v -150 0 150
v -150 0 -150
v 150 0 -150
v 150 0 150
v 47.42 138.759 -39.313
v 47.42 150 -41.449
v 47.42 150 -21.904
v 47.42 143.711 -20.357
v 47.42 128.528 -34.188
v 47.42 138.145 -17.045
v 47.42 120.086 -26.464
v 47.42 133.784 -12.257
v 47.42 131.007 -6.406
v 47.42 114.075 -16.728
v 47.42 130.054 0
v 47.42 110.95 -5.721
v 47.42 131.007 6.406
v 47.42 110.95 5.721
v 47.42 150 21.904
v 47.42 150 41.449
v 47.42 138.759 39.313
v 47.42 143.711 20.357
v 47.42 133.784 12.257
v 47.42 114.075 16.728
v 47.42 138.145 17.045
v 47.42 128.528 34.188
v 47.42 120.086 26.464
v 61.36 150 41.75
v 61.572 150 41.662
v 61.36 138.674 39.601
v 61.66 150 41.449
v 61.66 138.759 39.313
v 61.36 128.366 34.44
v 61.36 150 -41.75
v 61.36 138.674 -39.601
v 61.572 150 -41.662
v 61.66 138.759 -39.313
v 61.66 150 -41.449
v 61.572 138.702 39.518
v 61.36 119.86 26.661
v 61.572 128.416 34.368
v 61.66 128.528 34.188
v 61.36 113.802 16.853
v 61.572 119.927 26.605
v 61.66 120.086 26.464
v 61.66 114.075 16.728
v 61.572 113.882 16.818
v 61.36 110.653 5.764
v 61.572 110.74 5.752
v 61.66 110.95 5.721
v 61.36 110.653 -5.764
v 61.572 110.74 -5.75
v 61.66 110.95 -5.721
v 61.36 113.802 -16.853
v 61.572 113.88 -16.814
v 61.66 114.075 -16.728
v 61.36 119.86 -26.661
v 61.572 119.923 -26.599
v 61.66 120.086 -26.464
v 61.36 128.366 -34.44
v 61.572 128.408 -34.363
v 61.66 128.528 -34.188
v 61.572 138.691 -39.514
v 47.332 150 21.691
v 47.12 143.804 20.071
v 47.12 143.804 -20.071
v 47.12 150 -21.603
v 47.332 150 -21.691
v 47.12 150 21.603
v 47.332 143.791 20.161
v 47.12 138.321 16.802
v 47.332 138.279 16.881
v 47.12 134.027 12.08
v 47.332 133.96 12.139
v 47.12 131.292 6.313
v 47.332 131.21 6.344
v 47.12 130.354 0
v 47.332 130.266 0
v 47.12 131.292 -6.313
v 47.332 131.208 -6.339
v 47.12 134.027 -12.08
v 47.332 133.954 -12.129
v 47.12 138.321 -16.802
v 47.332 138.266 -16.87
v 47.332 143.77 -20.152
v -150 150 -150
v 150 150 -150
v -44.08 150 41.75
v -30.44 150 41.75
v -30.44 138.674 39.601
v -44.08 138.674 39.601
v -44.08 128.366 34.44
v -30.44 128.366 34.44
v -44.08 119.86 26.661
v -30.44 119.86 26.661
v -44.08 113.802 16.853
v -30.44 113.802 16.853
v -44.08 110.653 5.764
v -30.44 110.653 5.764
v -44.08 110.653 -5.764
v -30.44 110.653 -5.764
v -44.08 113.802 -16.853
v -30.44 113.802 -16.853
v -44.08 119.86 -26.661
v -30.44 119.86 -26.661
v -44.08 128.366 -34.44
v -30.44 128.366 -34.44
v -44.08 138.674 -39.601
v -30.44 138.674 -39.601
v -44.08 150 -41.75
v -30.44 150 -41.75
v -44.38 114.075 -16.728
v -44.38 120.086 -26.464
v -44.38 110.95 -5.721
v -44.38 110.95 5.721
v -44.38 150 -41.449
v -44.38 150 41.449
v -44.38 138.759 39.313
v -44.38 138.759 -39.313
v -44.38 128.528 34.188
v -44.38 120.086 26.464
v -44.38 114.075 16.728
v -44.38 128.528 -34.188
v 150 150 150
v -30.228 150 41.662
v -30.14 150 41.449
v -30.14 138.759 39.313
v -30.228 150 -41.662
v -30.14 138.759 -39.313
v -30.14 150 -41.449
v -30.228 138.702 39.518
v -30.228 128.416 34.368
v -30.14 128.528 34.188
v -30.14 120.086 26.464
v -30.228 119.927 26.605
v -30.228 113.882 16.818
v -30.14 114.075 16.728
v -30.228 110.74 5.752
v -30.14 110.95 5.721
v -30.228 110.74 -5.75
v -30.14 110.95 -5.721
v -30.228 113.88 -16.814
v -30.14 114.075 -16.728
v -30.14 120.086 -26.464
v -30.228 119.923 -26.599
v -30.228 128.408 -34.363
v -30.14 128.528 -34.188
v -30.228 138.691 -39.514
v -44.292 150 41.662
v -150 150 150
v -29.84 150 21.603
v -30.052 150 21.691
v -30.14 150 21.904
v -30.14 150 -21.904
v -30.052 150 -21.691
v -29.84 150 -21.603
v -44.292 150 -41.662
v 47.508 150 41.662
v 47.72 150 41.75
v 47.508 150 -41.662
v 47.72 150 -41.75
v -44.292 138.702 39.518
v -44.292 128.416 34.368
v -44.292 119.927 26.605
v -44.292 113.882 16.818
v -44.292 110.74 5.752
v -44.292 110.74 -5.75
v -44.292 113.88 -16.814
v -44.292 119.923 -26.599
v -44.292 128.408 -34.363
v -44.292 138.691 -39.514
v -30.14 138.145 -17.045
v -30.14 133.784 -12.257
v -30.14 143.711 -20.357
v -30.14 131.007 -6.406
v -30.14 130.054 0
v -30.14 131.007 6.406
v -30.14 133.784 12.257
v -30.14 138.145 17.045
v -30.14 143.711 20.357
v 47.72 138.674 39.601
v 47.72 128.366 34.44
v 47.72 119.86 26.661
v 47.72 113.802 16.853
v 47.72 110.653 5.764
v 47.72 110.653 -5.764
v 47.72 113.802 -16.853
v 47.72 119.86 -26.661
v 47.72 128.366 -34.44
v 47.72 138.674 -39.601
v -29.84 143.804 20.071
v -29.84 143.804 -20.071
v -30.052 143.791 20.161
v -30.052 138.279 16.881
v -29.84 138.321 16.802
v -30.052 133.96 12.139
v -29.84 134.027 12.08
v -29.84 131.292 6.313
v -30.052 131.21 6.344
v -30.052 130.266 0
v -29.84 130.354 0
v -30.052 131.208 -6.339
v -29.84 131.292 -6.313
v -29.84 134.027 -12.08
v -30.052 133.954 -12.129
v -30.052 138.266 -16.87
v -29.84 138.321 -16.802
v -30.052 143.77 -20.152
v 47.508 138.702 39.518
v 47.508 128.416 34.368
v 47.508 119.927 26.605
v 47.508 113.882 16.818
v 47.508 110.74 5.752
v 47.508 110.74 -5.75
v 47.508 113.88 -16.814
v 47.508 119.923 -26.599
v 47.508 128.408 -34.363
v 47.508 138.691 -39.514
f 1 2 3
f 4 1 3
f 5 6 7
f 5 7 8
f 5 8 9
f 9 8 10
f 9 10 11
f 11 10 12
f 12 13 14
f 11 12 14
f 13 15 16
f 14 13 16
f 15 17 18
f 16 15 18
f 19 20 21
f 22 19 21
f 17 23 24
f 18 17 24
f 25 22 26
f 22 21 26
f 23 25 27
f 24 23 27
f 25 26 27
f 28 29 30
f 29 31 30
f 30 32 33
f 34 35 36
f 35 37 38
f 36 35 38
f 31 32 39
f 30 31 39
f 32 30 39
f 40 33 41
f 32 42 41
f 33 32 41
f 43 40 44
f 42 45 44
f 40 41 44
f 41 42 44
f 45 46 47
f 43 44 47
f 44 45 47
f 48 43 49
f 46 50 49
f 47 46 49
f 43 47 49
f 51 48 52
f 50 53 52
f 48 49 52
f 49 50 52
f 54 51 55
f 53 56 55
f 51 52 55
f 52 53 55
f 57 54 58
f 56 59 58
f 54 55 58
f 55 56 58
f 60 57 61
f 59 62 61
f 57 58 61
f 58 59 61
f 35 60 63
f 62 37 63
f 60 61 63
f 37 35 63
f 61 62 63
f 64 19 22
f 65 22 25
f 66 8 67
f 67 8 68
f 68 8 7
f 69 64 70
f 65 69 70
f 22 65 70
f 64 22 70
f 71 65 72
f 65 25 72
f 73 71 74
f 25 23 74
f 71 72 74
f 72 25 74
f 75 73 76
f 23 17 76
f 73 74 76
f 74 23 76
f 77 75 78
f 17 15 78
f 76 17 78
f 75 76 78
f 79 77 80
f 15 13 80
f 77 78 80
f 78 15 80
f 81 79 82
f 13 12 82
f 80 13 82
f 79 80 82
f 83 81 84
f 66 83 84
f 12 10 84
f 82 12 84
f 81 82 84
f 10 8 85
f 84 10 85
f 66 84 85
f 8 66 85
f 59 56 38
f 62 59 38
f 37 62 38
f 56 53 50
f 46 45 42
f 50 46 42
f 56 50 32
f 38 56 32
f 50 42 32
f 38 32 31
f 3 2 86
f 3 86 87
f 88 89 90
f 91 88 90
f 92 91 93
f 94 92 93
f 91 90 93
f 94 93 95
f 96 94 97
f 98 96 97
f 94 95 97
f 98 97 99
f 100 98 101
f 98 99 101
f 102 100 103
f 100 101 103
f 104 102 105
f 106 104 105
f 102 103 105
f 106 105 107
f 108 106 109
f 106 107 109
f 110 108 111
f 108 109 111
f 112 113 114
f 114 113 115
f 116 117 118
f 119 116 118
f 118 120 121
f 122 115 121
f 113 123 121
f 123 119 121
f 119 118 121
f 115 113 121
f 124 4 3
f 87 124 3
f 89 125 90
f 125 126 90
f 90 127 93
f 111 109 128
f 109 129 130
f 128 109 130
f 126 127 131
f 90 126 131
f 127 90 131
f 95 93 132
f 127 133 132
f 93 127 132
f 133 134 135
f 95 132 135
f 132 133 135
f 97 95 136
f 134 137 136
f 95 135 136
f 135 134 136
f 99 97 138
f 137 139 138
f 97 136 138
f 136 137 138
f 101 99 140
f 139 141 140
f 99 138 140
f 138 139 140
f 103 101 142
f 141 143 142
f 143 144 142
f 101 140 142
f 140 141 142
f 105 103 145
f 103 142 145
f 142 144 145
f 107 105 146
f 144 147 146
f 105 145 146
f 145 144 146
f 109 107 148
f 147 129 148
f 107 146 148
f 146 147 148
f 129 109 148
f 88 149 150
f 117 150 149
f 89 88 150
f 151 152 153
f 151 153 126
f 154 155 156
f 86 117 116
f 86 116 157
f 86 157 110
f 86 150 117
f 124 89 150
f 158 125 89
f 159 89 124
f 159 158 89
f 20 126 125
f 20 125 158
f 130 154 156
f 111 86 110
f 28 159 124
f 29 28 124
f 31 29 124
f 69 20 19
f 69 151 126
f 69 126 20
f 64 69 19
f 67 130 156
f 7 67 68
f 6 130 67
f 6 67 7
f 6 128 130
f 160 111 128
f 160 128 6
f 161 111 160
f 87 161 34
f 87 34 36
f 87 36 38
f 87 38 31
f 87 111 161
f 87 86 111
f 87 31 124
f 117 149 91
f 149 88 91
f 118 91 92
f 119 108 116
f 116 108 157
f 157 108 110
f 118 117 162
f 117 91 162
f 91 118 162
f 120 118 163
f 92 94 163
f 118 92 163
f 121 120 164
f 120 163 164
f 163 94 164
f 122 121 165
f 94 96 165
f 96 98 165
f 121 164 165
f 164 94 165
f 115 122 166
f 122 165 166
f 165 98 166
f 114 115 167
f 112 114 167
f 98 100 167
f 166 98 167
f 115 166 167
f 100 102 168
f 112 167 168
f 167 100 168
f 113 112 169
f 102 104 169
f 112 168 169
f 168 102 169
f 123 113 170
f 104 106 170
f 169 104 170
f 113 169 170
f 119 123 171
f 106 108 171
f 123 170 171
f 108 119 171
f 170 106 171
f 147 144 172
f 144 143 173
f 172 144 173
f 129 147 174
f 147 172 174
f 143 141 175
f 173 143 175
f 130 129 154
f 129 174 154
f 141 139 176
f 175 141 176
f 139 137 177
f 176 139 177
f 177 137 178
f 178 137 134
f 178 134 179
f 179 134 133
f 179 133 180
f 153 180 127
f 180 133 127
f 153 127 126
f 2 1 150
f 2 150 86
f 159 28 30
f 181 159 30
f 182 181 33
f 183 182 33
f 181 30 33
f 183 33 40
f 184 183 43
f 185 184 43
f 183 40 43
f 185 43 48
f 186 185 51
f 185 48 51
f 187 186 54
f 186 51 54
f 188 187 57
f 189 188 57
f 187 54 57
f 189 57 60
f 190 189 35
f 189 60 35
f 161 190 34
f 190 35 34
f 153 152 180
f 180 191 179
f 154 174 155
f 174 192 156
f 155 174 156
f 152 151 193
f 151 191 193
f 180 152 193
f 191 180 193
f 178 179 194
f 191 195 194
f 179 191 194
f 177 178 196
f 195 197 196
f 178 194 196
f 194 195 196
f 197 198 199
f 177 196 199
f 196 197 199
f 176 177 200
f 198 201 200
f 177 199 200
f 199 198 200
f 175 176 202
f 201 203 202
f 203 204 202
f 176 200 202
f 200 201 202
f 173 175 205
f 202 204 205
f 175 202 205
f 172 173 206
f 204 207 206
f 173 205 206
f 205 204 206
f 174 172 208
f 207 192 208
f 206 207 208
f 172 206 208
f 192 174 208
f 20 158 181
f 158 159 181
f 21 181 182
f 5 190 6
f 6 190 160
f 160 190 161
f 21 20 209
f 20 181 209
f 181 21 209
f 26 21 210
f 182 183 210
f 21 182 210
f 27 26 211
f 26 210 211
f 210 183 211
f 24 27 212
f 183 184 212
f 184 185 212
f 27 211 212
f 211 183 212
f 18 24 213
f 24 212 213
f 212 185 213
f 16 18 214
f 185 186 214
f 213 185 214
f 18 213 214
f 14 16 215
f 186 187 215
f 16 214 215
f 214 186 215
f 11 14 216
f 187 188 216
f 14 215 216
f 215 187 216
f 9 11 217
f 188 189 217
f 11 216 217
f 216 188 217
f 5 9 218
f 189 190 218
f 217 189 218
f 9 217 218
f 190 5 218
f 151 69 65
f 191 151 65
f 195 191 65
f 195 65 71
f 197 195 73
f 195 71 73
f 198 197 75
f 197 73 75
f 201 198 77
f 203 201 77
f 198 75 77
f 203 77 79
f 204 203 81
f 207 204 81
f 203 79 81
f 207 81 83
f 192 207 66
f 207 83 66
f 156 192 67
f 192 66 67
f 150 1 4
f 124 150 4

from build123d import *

# Parameters (mm, degrees)
SKETCH1_W           = 300
SKETCH1_H           = 300
BOSS_EXTRUDE1_DEPTH = 150


# Read off the part's stored shape, not the designer's step: Cavity1
with BuildPart() as part:
    # Sketch1 → Boss-Extrude1 (new body)
    with BuildSketch(Plane(origin=(0, 0, 0), x_dir=(1, 0, 0), z_dir=(0, 1, 0))):
        Rectangle(SKETCH1_W, SKETCH1_H)
    extrude(amount=BOSS_EXTRUDE1_DEPTH)

    # Cavity1 outline → Cavity1 (revolve, cut)
    with BuildSketch(Plane(origin=(0, 152.053618149, 0), x_dir=(0, 1, 0), z_dir=(0, 0, -1))):
        with BuildLine():
            Line((41.5, 61.660319704), (2.053618149, 61.660319704))
            Line((2.053618149, 61.660319704), (2.053618149, -44.379680296))
            Line((2.053618149, -44.379680296), (41.5, -44.379680296))
            ThreePointArc((41.5, -44.379680296), (41.712132035, -44.291812331), (41.8, -44.079680296))
            Line((41.8, -44.079680296), (41.8, -30.439680296))
            ThreePointArc((41.8, -30.439680296), (41.712132034, -30.227548262), (41.5, -30.139680296))
            Line((41.5, -30.139680296), (22, -30.139680296))
            ThreePointArc((22, -30.139680296), (21.787867965, -30.051812331), (21.7, -29.839680296))
            Line((21.7, -29.839680296), (21.7, 47.120319704))
            ThreePointArc((21.7, 47.120319704), (21.787867966, 47.332451738), (22, 47.420319704))
            Line((22, 47.420319704), (41.5, 47.420319704))
            ThreePointArc((41.5, 47.420319704), (41.712132035, 47.508187669), (41.8, 47.720319704))
            Line((41.8, 47.720319704), (41.8, 61.360319704))
            ThreePointArc((41.8, 61.360319704), (41.712132034, 61.572451738), (41.5, 61.660319704))
        make_face()
    revolve(axis=Axis((0, 152.053618149, 0), (1, 0, 0)), mode=Mode.SUBTRACT)


solid = part.part
